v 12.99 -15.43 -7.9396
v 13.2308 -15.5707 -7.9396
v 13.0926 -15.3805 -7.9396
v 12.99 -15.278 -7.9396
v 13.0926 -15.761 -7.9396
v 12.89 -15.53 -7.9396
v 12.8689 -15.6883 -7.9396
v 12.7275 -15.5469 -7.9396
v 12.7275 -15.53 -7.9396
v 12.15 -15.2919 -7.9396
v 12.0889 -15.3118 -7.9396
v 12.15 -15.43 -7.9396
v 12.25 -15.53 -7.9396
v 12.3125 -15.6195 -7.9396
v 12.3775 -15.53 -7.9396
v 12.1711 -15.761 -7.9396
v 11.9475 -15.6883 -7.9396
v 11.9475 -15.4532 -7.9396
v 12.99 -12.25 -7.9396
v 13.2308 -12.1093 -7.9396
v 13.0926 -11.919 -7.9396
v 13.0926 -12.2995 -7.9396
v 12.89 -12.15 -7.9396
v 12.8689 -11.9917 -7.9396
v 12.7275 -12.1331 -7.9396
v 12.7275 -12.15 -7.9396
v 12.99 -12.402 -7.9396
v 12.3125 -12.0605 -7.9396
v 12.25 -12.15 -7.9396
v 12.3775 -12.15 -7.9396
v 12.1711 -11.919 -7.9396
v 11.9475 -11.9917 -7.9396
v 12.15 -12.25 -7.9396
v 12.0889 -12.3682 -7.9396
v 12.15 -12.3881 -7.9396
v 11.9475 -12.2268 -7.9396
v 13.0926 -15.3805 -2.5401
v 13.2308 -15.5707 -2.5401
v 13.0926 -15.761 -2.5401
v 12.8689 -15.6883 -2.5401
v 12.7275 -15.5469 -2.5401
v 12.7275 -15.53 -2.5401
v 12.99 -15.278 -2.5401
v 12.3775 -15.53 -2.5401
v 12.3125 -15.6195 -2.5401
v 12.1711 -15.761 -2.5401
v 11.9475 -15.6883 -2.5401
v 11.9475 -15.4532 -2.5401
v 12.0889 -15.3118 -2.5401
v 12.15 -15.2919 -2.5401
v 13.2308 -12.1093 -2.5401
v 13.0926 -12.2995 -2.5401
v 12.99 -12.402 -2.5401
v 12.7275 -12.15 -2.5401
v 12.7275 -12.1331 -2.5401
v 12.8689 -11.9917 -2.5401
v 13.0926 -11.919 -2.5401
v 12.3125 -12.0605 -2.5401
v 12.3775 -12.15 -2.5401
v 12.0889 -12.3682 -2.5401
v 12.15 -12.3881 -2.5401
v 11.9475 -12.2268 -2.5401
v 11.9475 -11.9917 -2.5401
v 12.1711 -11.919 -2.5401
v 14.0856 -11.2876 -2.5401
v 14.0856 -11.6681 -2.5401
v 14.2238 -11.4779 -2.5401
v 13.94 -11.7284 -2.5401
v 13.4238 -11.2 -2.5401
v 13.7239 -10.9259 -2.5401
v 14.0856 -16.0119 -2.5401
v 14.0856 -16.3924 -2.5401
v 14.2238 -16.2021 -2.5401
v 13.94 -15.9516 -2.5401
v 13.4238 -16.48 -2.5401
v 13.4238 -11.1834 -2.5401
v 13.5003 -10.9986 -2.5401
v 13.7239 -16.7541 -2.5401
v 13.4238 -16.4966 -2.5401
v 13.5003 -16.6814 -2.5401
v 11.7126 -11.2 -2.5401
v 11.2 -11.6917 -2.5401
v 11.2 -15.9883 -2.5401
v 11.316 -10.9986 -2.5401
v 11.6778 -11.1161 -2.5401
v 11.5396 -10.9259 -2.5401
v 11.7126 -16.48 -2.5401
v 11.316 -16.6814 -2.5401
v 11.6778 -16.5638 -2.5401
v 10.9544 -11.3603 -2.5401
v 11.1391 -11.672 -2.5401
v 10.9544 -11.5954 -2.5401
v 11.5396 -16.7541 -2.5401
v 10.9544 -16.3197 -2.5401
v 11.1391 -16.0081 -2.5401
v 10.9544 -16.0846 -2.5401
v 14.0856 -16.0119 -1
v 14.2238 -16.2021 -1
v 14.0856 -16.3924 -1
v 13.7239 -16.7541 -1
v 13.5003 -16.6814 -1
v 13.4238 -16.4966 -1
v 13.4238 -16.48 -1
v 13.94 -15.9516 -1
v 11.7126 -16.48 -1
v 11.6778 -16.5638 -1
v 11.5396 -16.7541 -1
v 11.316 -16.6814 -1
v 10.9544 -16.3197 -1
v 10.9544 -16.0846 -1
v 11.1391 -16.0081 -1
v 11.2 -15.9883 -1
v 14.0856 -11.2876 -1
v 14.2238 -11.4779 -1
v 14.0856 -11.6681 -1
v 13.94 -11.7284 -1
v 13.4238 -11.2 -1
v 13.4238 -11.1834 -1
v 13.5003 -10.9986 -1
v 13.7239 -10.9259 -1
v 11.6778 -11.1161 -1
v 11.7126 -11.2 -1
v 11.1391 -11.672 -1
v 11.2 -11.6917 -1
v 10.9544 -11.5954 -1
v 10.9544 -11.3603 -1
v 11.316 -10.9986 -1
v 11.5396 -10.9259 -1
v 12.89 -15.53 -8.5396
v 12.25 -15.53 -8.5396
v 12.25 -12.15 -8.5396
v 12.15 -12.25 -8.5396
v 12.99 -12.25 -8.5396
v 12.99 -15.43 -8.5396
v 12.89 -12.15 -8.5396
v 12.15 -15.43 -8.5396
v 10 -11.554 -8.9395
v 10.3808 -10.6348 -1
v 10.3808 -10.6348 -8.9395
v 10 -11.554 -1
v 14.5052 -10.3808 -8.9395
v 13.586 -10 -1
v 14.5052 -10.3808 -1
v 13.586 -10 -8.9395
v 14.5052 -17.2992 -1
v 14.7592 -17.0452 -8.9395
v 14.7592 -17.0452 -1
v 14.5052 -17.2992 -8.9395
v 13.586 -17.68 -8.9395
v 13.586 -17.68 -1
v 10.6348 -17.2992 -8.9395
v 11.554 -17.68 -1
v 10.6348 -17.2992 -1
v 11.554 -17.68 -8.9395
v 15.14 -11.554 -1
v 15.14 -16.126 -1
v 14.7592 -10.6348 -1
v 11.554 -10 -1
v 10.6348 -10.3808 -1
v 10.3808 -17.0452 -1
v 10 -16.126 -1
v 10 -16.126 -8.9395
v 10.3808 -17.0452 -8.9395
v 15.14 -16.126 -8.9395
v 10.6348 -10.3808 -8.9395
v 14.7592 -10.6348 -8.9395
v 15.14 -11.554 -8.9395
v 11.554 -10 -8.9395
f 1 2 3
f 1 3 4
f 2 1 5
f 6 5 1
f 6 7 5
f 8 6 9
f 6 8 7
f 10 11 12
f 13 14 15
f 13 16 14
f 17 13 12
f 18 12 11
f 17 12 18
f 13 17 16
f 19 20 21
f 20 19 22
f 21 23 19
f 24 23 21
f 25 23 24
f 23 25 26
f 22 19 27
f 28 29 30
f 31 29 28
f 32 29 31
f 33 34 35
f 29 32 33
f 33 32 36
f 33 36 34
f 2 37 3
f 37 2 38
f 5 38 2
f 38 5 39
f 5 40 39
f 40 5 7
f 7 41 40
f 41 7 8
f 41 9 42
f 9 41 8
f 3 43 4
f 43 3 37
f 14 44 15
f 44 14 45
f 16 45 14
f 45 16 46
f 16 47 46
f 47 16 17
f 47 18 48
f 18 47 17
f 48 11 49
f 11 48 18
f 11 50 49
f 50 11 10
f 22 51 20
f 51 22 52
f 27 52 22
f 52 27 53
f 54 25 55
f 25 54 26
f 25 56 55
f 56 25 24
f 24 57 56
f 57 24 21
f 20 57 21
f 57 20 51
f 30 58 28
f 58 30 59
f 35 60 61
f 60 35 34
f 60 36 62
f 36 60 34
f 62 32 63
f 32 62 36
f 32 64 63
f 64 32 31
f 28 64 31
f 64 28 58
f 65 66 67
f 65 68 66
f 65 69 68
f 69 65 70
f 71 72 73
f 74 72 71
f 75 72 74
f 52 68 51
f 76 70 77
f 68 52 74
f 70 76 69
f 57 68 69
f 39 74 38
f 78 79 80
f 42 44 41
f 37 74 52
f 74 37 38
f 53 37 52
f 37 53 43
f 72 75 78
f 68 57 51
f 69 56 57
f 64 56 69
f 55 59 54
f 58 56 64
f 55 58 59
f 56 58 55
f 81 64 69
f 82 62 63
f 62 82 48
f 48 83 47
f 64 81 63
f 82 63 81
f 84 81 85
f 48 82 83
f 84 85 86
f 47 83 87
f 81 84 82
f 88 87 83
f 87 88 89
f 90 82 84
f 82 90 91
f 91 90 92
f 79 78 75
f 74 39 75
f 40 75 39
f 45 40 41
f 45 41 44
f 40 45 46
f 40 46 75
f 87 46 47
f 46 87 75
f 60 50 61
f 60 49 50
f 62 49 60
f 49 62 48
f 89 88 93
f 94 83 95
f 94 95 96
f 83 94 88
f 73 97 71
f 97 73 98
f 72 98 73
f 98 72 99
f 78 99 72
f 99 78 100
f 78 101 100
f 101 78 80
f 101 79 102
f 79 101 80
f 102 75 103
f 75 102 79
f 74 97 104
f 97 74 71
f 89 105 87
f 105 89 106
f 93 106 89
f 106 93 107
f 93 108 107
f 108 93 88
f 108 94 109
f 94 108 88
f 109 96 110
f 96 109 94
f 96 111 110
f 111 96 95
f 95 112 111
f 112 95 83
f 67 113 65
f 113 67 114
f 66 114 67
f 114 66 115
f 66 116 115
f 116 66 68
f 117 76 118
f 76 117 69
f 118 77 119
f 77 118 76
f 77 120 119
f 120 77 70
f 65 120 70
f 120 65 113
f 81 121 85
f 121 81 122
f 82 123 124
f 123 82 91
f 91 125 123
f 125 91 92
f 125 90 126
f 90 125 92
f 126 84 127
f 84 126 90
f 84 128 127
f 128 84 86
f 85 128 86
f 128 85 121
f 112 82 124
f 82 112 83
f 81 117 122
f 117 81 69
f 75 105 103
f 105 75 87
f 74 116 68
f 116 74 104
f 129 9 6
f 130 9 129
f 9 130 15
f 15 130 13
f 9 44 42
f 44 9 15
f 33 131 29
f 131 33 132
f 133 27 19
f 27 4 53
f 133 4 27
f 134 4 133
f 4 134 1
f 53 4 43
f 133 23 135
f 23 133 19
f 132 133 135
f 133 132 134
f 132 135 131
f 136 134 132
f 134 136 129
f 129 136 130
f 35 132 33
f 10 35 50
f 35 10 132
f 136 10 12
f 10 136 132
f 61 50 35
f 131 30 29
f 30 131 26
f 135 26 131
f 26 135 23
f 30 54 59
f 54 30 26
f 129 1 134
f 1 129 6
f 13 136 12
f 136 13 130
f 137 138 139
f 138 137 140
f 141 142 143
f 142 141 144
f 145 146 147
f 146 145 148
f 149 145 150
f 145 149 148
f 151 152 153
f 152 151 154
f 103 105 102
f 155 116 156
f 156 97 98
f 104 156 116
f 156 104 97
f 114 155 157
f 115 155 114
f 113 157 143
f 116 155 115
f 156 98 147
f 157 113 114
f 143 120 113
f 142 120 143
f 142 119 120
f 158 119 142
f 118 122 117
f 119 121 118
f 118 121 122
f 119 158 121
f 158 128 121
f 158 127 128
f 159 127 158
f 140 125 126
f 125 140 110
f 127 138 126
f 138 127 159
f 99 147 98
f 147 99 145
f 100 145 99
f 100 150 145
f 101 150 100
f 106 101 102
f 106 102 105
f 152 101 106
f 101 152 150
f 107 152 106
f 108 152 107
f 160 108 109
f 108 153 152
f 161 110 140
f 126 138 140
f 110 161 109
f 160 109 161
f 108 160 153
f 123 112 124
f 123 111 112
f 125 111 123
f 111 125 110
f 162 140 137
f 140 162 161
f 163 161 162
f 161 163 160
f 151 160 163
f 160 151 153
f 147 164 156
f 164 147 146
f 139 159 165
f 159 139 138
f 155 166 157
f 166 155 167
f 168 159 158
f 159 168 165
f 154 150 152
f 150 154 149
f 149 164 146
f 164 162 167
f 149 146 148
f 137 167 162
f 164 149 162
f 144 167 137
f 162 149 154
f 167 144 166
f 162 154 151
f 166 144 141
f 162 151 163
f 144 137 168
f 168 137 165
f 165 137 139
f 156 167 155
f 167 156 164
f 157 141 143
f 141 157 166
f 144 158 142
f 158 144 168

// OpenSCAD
// Customizable Jig Generator
// In OpenSCAD, use "Description Only" for best user experience
// understanding the tunable parameters.
// -----------------------------------------------------
// Auto generated file by jigit, the awesome automatic
// jig generator for your PCB designs. Checkout the project
// at https://github.com/shreekumar3d/jigit
// -----------------------------------------------------
// Configuration file : test-boards/footprint-test/config.toml
//
// Complete configuration file is embedded at the end of this
// file.
//Thickness(height) of base
Base_Thickness = 0.4; // [0.0:0.2:1.0]
/* [Include these footprints in output STL file] */
//Connector_PinHeader_2.54mm:PinHeader_1x02_P2.54mm_Vertical
Include_FP1_in_Jig=true; // [false,true]
/* [Footprint: Connector_PinHeader_2.54mm:PinHeader_1x02_P2.54mm_Vertical] */
//XY Gap in shell for component insertion
Effective_Shell_Gap_For_FP1 = 0.1;
//Thickness of shell
Effective_Shell_Thickness_For_FP1 = 1.2;
//Z distance from start of shell to PCB
Effective_Shell_Clearance_From_PCB_For_FP1 = 1;
//Type of shell for this footprint
Shell_Type_For_FP1="fitting"; // [wiggle,fitting,fitting_flower,tight,courtyard]
//Insert this component into jig from this side.(Bottom insertion requires wiggle or courtyard shell to work)
Insert_FP1_From="top"; // [top,bottom]
//Wrapper thickness
Wrapper_Thickness_For_FP1=0.0; // [0:0.1:10.0]
//Wrapper height
Wrapper_Height_For_FP1=0.0; // [0:0.1:8.539479970932007]
/* [Hidden] */

// Height of the tallest component on the top side
topmost_z=8.539479970932007;
    bottom_insertion_z = 9.339479970932008;
// Height of the individual components
max_z_FP1= (Insert_FP1_From=="bottom")? bottom_insertion_z : 8.539479970932007; //Applies to 3D Model(s): ${KICAD8_3DMODEL_DIR}/Connector_PinHeader_2.54mm.3dshapes/PinHeader_1x02_P2.54mm_Vertical.wrl
min_z_FP1= -2.9997399854660034;
// } END : Computed Values

tiny_dimension = 0.0001;
PCB_Thickness = 0;
c_Base_Thickness = Base_Thickness;
c_Base_Line_Height = 1.0;
module peri_line_scad(start,end,line_width){
	hull() {
		translate(v = start) {
			circle(d = line_width);
		}
		translate(v = end) {
			circle(d = line_width);
		}
	}
}
module fitting_cuts_FP1_0(){
	union() {
		translate(v = [0, 0, ((PCB_Thickness - tiny_dimension) + max(2.54, Effective_Shell_Clearance_From_PCB_For_FP1))]) {
			rotate(a = [0, 0, 0]) {
				linear_extrude(height = ((min(((topmost_z + c_Base_Thickness) - c_Base_Line_Height), 8.539479970932007) - max(2.54, Effective_Shell_Clearance_From_PCB_For_FP1)) + (2 * tiny_dimension))) {
					union() {
						peri_line_scad([0.3193328983662705, -2.8593330119131193],[0.46075425460358, -3.000754368150429],0.4);
						peri_line_scad([0.3193328983662705, 0.3193328983662705],[0.46075425460358, 0.46075425460358],0.4);
						peri_line_scad([-0.3193328983662705, 0.3193328983662705],[-0.46075425460358, 0.46075425460358],0.4);
						peri_line_scad([-0.3193328983662705, -2.8593330119131193],[-0.46075425460358, -3.000754368150429],0.4);
					}
				}
			}
		}
		translate(v = [0, 0, (PCB_Thickness - tiny_dimension)]) {
			rotate(a = [0, 0, 0]) {
				linear_extrude(height = (min(((topmost_z + c_Base_Thickness) - c_Base_Line_Height), 8.539479970932007) + (2 * tiny_dimension))) {
					union();
				}
			}
		}
		translate(v = [0, 0, ((PCB_Thickness - tiny_dimension) + max(-2.9997399854660034, Effective_Shell_Clearance_From_PCB_For_FP1))]) {
			rotate(a = [0, 0, 0]) {
				linear_extrude(height = ((min(((topmost_z + c_Base_Thickness) - c_Base_Line_Height), 2.54) - max(-2.9997399854660034, Effective_Shell_Clearance_From_PCB_For_FP1)) + (2 * tiny_dimension))) {
					union() {
						peri_line_scad([1.2690761204389767, -3.55561725607815],[1.4538520326436606, -3.632153928784291],0.4);
						hull() {
							union() {
								peri_line_scad([1.2690761204674887, 1.0156173317072148],[1.4538520269697461, 1.0921540181802327],0.4);
								peri_line_scad([1.0156173317072148, 1.2690761204674887],[1.0921540181802327, 1.4538520269697461],0.4);
							}
						}
						peri_line_scad([1.0156173317072148, 1.2690761204674887],[1.0921540181802327, 1.4538520269697461],0.4);
						hull() {
							union() {
								peri_line_scad([-1.0156173317072148, 1.2690761204674887],[-1.0921540181802327, 1.4538520269697461],0.4);
								peri_line_scad([-1.2690761204674887, 1.0156173317072148],[-1.4538520269697461, 1.0921540181802327],0.4);
							}
						}
						peri_line_scad([-1.2690761204674887, 1.0156173317072148],[-1.4538520269697461, 1.0921540181802327],0.4);
						hull() {
							union() {
								peri_line_scad([-1.2690761204389767, -3.55561725607815],[-1.4538520326436606, -3.632153928784291],0.4);
								peri_line_scad([-1.0156173316383803, -3.809076120496001],[-1.0921540318782748, -3.993852021295831],0.4);
							}
						}
						peri_line_scad([-1.0156173316383803, -3.809076120496001],[-1.0921540318782748, -3.993852021295831],0.4);
						hull() {
							union() {
								peri_line_scad([1.0156173316383803, -3.809076120496001],[1.0921540318782748, -3.993852021295831],0.4);
								peri_line_scad([1.2690761204389767, -3.55561725607815],[1.4538520326436606, -3.632153928784291],0.4);
							}
						}
					}
				}
			}
		}
		translate(v = [0, 0, (PCB_Thickness - tiny_dimension)]) {
			rotate(a = [0, 0, 0]) {
				linear_extrude(height = (min(((topmost_z + c_Base_Thickness) - c_Base_Line_Height), 2.54) + (2 * tiny_dimension))) {
					union();
				}
			}
		}
	}
}
module hullpoly_FP1_0_0(){
	polygon(points = [[1.27, -3.555999939441681], [1.27, 1.0160000151395798], [1.0160000151395798, 1.27], [-1.0160000151395798, 1.27], [-1.27, 1.0160000151395798], [-1.27, -3.555999939441681], [-1.0160000151395798, -3.81], [1.0160000151395798, -3.81]]);
}
module hullpoly_FP1_0_1(){
	polygon(points = [[0.32004000514745706, -2.8600401186943056], [0.32004000514745706, 0.32004000514745706], [-0.32004000514745706, 0.32004000514745706], [-0.32004000514745706, -2.8600401186943056]]);
}
module fitting_pocket_FP1_0(){
	union() {
		translate(v = [0, 0, ((PCB_Thickness - tiny_dimension) + -2.9997399854660034)]) {
			rotate(a = [0, 0, 0]) {
				linear_extrude(height = (5.539739985466003 + (2 * tiny_dimension))) {
					offset(r = Effective_Shell_Gap_For_FP1) {
						union() {
							hullpoly_FP1_0_0();
						}
					}
				}
			}
		}
		translate(v = [0, 0, ((PCB_Thickness - tiny_dimension) + 2.54)]) {
			rotate(a = [0, 0, 0]) {
				linear_extrude(height = (5.999479970932007 + (2 * tiny_dimension))) {
					offset(r = Effective_Shell_Gap_For_FP1) {
						union() {
							hullpoly_FP1_0_1();
						}
					}
				}
			}
		}
	}
}
module ref_FP1_0(){
	union() {
		hullpoly_FP1_0_0();
	}
}
module wiggle_pocket_FP1_0(){
	translate(v = [0, 0, (PCB_Thickness + min_z_FP1)]) {
		rotate(a = [0, 0, 0]) {
			linear_extrude(height = (max_z_FP1 - min_z_FP1)) {
				offset(r = Effective_Shell_Gap_For_FP1) {
					union() {
						ref_FP1_0();
					}
				}
			}
		}
	}
}
module perimeter_FP1_0(){
	union() {
		translate(v = [0, 0, (PCB_Thickness + Effective_Shell_Clearance_From_PCB_For_FP1)]) {
			rotate(a = [0, 0, 0]) {
				linear_extrude(height = ((topmost_z - Effective_Shell_Clearance_From_PCB_For_FP1) + c_Base_Thickness)) {
					offset(r = (Effective_Shell_Gap_For_FP1 + Effective_Shell_Thickness_For_FP1)) {
						union() {
							ref_FP1_0();
						}
					}
				}
			}
		}
		translate(v = [0, 0, (((PCB_Thickness + topmost_z) + c_Base_Thickness) - Wrapper_Height_For_FP1)]) {
			rotate(a = [0, 0, 0]) {
				linear_extrude(height = Wrapper_Height_For_FP1) {
					difference() {
						offset(r = ((Effective_Shell_Gap_For_FP1 + Effective_Shell_Thickness_For_FP1) + Wrapper_Thickness_For_FP1)) {
							union() {
								ref_FP1_0();
							}
						}
						offset(r = (Effective_Shell_Gap_For_FP1 + Effective_Shell_Thickness_For_FP1)) {
							union() {
								ref_FP1_0();
							}
						}
					}
				}
			}
		}
	}
}
module fitting_flower_FP1_0(){
	union() {
		translate(v = [0, 0, ((PCB_Thickness + max(-2.9997399854660034, Effective_Shell_Clearance_From_PCB_For_FP1)) - tiny_dimension)]) {
			rotate(a = [0, 0, 0]) {
				linear_extrude(height = ((max_z_FP1 - max(-2.9997399854660034, Effective_Shell_Clearance_From_PCB_For_FP1)) + (2 * tiny_dimension))) {
					difference() {
						offset(r = (Effective_Shell_Gap_For_FP1 + Effective_Shell_Thickness_For_FP1)) {
							union() {
								hullpoly_FP1_0_0();
							}
						}
						offset(r = Effective_Shell_Gap_For_FP1) {
							union() {
								hullpoly_FP1_0_0();
							}
						}
					}
				}
			}
		}
		translate(v = [0, 0, ((PCB_Thickness + max(2.54, Effective_Shell_Clearance_From_PCB_For_FP1)) - tiny_dimension)]) {
			rotate(a = [0, 0, 0]) {
				linear_extrude(height = ((max_z_FP1 - max(2.54, Effective_Shell_Clearance_From_PCB_For_FP1)) + (2 * tiny_dimension))) {
					difference() {
						offset(r = (Effective_Shell_Gap_For_FP1 + Effective_Shell_Thickness_For_FP1)) {
							union() {
								hullpoly_FP1_0_1();
							}
						}
						offset(r = Effective_Shell_Gap_For_FP1) {
							union() {
								hullpoly_FP1_0_1();
							}
						}
					}
				}
			}
		}
		translate(v = [0, 0, (((PCB_Thickness + topmost_z) + c_Base_Thickness) - Wrapper_Height_For_FP1)]) {
			rotate(a = [0, 0, 0]) {
				linear_extrude(height = Wrapper_Height_For_FP1) {
					difference() {
						offset(r = ((Effective_Shell_Gap_For_FP1 + Effective_Shell_Thickness_For_FP1) + Wrapper_Thickness_For_FP1)) {
							union() {
								ref_FP1_0();
							}
						}
						offset(r = (Effective_Shell_Gap_For_FP1 + Effective_Shell_Thickness_For_FP1)) {
							union() {
								ref_FP1_0();
							}
						}
					}
				}
			}
		}
		translate(v = [0, 0, (PCB_Thickness + max_z_FP1)]) {
			rotate(a = [0, 0, 0]) {
				linear_extrude(height = ((topmost_z - max_z_FP1) + c_Base_Thickness)) {
					offset(r = (Effective_Shell_Gap_For_FP1 + Effective_Shell_Thickness_For_FP1)) {
						union() {
							ref_FP1_0();
						}
					}
				}
			}
		}
	}
}
module shape_FP1_0_0(){
	union() {
		polygon(points = [[1.016, -3.81], [1.266, -3.56], [1.27, -3.556], [1.27, -1.556], [1.27, -1.524], [1.02, -1.274], [1.016, -1.27], [1.266, -1.02], [1.27, -1.016], [1.27, 0.984], [1.27, 1.016], [1.02, 1.266], [1.016, 1.27], [-0.984, 1.27], [-1.016, 1.27], [-1.27, 1.016], [-1.27, -1.016], [-1.016, -1.27], [-1.27, -1.524], [-1.27, -3.556], [-1.016, -3.81]]);
	}
}
module keepout_volume_FP1_0_0(){
	translate(v = [0, 0, (PCB_Thickness + max(-2.9997399854660034, Effective_Shell_Clearance_From_PCB_For_FP1))]) {
		rotate(a = [0, 0, 0]) {
			linear_extrude(height = ((2.539479970932007 - max(-2.9997399854660034, Effective_Shell_Clearance_From_PCB_For_FP1)) + tiny_dimension)) {
				offset(r = Effective_Shell_Gap_For_FP1) {
					union() {
						shape_FP1_0_0();
					}
				}
			}
		}
	}
}
module shape_FP1_0_1(){
	union() {
		polygon(points = [[0.209, -0.658], [0.258, -0.65], [0.305, -0.638], [0.351, -0.622], [0.396, -0.601], [0.438, -0.576], [0.477, -0.547], [0.514, -0.514], [0.547, -0.477], [0.576, -0.438], [0.601, -0.396], [0.622, -0.351], [0.638, -0.305], [0.65, -0.258], [0.658, -0.209], [0.66, -0.16], [0.66, 0.16], [0.658, 0.209], [0.65, 0.258], [0.638, 0.305], [0.622, 0.351], [0.601, 0.396], [0.576, 0.438], [0.547, 0.477], [0.514, 0.514], [0.477, 0.547], [0.438, 0.576], [0.396, 0.601], [0.351, 0.622], [0.305, 0.638], [0.258, 0.65], [0.209, 0.658], [0.16, 0.66], [-0.16, 0.66], [-0.209, 0.658], [-0.258, 0.65], [-0.305, 0.638], [-0.351, 0.622], [-0.396, 0.601], [-0.438, 0.576], [-0.477, 0.547], [-0.514, 0.514], [-0.547, 0.477], [-0.576, 0.438], [-0.601, 0.396], [-0.622, 0.351], [-0.638, 0.305], [-0.65, 0.258], [-0.658, 0.209], [-0.66, 0.16], [-0.66, -0.16], [-0.658, -0.209], [-0.65, -0.258], [-0.638, -0.305], [-0.622, -0.351], [-0.601, -0.396], [-0.576, -0.438], [-0.547, -0.477], [-0.514, -0.514], [-0.477, -0.547], [-0.438, -0.576], [-0.396, -0.601], [-0.351, -0.622], [-0.305, -0.638], [-0.258, -0.65], [-0.209, -0.658], [-0.16, -0.66], [0.16, -0.66]]);
		polygon(points = [[0.209, -3.198], [0.258, -3.19], [0.305, -3.178], [0.351, -3.162], [0.396, -3.141], [0.438, -3.116], [0.477, -3.087], [0.514, -3.054], [0.547, -3.017], [0.576, -2.978], [0.601, -2.936], [0.622, -2.891], [0.638, -2.845], [0.65, -2.798], [0.658, -2.749], [0.66, -2.7], [0.66, -2.38], [0.658, -2.331], [0.65, -2.282], [0.638, -2.235], [0.622, -2.189], [0.601, -2.144], [0.576, -2.102], [0.547, -2.063], [0.514, -2.026], [0.477, -1.993], [0.438, -1.964], [0.396, -1.939], [0.351, -1.918], [0.305, -1.902], [0.258, -1.89], [0.209, -1.882], [0.16, -1.88], [-0.16, -1.88], [-0.209, -1.882], [-0.258, -1.89], [-0.305, -1.902], [-0.351, -1.918], [-0.396, -1.939], [-0.438, -1.964], [-0.477, -1.993], [-0.514, -2.026], [-0.547, -2.063], [-0.576, -2.102], [-0.601, -2.144], [-0.622, -2.189], [-0.638, -2.235], [-0.65, -2.282], [-0.658, -2.331], [-0.66, -2.38], [-0.66, -2.7], [-0.658, -2.749], [-0.65, -2.798], [-0.638, -2.845], [-0.622, -2.891], [-0.601, -2.936], [-0.576, -2.978], [-0.547, -3.017], [-0.514, -3.054], [-0.477, -3.087], [-0.438, -3.116], [-0.396, -3.141], [-0.351, -3.162], [-0.305, -3.178], [-0.258, -3.19], [-0.209, -3.198], [-0.16, -3.2], [0.16, -3.2]]);
	}
}
module keepout_volume_FP1_0_1(){
	translate(v = [0, 0, (PCB_Thickness + max(-2.9997399854660034, Effective_Shell_Clearance_From_PCB_For_FP1))]) {
		rotate(a = [0, 0, 0]) {
			linear_extrude(height = ((8.539479970932007 - max(-2.9997399854660034, Effective_Shell_Clearance_From_PCB_For_FP1)) + tiny_dimension)) {
				offset(r = Effective_Shell_Gap_For_FP1) {
					union() {
						shape_FP1_0_1();
					}
				}
			}
		}
	}
}
module tight_perimeter_FP1_0(){
	union() {
		translate(v = [0, 0, (PCB_Thickness + Effective_Shell_Clearance_From_PCB_For_FP1)]) {
			rotate(a = [0, 0, 0]) {
				linear_extrude(height = ((topmost_z - Effective_Shell_Clearance_From_PCB_For_FP1) + c_Base_Thickness)) {
					offset(r = (Effective_Shell_Gap_For_FP1 + Effective_Shell_Thickness_For_FP1)) {
						union() {
							shape_FP1_0_0();
						}
					}
				}
			}
		}
		translate(v = [0, 0, (((PCB_Thickness + topmost_z) + c_Base_Thickness) - Wrapper_Height_For_FP1)]) {
			rotate(a = [0, 0, 0]) {
				linear_extrude(height = Wrapper_Height_For_FP1) {
					difference() {
						offset(r = ((Effective_Shell_Gap_For_FP1 + Effective_Shell_Thickness_For_FP1) + Wrapper_Thickness_For_FP1)) {
							union() {
								shape_FP1_0_0();
							}
						}
						offset(r = (Effective_Shell_Gap_For_FP1 + Effective_Shell_Thickness_For_FP1)) {
							union() {
								shape_FP1_0_0();
							}
						}
					}
				}
			}
		}
	}
}
module tight_pocket_FP1_0(){
	union() {
		keepout_volume_FP1_0_0();
		keepout_volume_FP1_0_1();
	}
}
module courtyard_FP1(){
	polygon(points = [[1.8, 4.35], [1.8, -1.8], [-1.8, -1.8], [-1.8, 4.35]]);
}
module courtyard_pocket_FP1(){
	translate(v = [0, 0, PCB_Thickness]) {
		translate(v = [0, 0, min_z_FP1]) {
			linear_extrude(height = (max_z_FP1 - min_z_FP1)) {
				offset(r = Effective_Shell_Gap_For_FP1) {
					union() {
						courtyard_FP1();
					}
				}
			}
		}
	}
}
module courtyard_perimeter_FP1(){
	union() {
		translate(v = [0, 0, (PCB_Thickness + Effective_Shell_Clearance_From_PCB_For_FP1)]) {
			linear_extrude(height = ((topmost_z - Effective_Shell_Clearance_From_PCB_For_FP1) + c_Base_Thickness)) {
				offset(r = (Effective_Shell_Gap_For_FP1 + Effective_Shell_Thickness_For_FP1)) {
					union() {
						courtyard_FP1();
					}
				}
			}
		}
		translate(v = [0, 0, (((PCB_Thickness + topmost_z) + c_Base_Thickness) - Wrapper_Height_For_FP1)]) {
			linear_extrude(height = Wrapper_Height_For_FP1) {
				difference() {
					offset(r = ((Effective_Shell_Gap_For_FP1 + Effective_Shell_Thickness_For_FP1) + Wrapper_Thickness_For_FP1)) {
						union() {
							courtyard_FP1();
						}
					}
					offset(r = (Effective_Shell_Gap_For_FP1 + Effective_Shell_Thickness_For_FP1)) {
						union() {
							courtyard_FP1();
						}
					}
				}
			}
		}
	}
}

//
module mounted_component_shells() {
  union() {
  translate([12.57,15.110000000000001,0]) {
  rotate([0,0,0]) {
  if(Include_FP1_in_Jig) {
    if(Shell_Type_For_FP1=="courtyard") {
      courtyard_perimeter_FP1();
    } else if(Shell_Type_For_FP1=="tight") {
      tight_perimeter_FP1_0();
    } else if(Shell_Type_For_FP1=="fitting_flower") {
      fitting_flower_FP1_0();
    } else {
      perimeter_FP1_0();
    }
  }
  }
  }
  }
}
module mounted_component_cuts() {
  union() {
  translate([12.57,15.110000000000001,0]) {
  rotate([0,0,0]) {
    if(Include_FP1_in_Jig) {
      if(Shell_Type_For_FP1=="fitting") {
        fitting_cuts_FP1_0();
      } else if(Shell_Type_For_FP1=="fitting_flower") {
        fitting_cuts_FP1_0();
      }
    }
  }
  }
  }
}
module mounted_component_pockets() {
  union() {
  translate([12.57,15.110000000000001,0]) {
  rotate([0,0,0]) {
    if(Shell_Type_For_FP1=="courtyard") {
      courtyard_pocket_FP1();
    } else if(Shell_Type_For_FP1=="wiggle") {
      wiggle_pocket_FP1_0();
    } else if(Shell_Type_For_FP1=="tight") {
      tight_pocket_FP1_0();
    } else { //fitting or fitting_flower
      fitting_pocket_FP1_0();
    }
  }
  }
  }
}
module all_models() {
  difference() {
    mounted_component_shells();
    union() {
      mounted_component_cuts();
      mounted_component_pockets();
    }
  }
}
orient_to_print=1;
if(orient_to_print == 1) {
  rotate([180,0,0]) all_models();
} else {
  all_models();
}
